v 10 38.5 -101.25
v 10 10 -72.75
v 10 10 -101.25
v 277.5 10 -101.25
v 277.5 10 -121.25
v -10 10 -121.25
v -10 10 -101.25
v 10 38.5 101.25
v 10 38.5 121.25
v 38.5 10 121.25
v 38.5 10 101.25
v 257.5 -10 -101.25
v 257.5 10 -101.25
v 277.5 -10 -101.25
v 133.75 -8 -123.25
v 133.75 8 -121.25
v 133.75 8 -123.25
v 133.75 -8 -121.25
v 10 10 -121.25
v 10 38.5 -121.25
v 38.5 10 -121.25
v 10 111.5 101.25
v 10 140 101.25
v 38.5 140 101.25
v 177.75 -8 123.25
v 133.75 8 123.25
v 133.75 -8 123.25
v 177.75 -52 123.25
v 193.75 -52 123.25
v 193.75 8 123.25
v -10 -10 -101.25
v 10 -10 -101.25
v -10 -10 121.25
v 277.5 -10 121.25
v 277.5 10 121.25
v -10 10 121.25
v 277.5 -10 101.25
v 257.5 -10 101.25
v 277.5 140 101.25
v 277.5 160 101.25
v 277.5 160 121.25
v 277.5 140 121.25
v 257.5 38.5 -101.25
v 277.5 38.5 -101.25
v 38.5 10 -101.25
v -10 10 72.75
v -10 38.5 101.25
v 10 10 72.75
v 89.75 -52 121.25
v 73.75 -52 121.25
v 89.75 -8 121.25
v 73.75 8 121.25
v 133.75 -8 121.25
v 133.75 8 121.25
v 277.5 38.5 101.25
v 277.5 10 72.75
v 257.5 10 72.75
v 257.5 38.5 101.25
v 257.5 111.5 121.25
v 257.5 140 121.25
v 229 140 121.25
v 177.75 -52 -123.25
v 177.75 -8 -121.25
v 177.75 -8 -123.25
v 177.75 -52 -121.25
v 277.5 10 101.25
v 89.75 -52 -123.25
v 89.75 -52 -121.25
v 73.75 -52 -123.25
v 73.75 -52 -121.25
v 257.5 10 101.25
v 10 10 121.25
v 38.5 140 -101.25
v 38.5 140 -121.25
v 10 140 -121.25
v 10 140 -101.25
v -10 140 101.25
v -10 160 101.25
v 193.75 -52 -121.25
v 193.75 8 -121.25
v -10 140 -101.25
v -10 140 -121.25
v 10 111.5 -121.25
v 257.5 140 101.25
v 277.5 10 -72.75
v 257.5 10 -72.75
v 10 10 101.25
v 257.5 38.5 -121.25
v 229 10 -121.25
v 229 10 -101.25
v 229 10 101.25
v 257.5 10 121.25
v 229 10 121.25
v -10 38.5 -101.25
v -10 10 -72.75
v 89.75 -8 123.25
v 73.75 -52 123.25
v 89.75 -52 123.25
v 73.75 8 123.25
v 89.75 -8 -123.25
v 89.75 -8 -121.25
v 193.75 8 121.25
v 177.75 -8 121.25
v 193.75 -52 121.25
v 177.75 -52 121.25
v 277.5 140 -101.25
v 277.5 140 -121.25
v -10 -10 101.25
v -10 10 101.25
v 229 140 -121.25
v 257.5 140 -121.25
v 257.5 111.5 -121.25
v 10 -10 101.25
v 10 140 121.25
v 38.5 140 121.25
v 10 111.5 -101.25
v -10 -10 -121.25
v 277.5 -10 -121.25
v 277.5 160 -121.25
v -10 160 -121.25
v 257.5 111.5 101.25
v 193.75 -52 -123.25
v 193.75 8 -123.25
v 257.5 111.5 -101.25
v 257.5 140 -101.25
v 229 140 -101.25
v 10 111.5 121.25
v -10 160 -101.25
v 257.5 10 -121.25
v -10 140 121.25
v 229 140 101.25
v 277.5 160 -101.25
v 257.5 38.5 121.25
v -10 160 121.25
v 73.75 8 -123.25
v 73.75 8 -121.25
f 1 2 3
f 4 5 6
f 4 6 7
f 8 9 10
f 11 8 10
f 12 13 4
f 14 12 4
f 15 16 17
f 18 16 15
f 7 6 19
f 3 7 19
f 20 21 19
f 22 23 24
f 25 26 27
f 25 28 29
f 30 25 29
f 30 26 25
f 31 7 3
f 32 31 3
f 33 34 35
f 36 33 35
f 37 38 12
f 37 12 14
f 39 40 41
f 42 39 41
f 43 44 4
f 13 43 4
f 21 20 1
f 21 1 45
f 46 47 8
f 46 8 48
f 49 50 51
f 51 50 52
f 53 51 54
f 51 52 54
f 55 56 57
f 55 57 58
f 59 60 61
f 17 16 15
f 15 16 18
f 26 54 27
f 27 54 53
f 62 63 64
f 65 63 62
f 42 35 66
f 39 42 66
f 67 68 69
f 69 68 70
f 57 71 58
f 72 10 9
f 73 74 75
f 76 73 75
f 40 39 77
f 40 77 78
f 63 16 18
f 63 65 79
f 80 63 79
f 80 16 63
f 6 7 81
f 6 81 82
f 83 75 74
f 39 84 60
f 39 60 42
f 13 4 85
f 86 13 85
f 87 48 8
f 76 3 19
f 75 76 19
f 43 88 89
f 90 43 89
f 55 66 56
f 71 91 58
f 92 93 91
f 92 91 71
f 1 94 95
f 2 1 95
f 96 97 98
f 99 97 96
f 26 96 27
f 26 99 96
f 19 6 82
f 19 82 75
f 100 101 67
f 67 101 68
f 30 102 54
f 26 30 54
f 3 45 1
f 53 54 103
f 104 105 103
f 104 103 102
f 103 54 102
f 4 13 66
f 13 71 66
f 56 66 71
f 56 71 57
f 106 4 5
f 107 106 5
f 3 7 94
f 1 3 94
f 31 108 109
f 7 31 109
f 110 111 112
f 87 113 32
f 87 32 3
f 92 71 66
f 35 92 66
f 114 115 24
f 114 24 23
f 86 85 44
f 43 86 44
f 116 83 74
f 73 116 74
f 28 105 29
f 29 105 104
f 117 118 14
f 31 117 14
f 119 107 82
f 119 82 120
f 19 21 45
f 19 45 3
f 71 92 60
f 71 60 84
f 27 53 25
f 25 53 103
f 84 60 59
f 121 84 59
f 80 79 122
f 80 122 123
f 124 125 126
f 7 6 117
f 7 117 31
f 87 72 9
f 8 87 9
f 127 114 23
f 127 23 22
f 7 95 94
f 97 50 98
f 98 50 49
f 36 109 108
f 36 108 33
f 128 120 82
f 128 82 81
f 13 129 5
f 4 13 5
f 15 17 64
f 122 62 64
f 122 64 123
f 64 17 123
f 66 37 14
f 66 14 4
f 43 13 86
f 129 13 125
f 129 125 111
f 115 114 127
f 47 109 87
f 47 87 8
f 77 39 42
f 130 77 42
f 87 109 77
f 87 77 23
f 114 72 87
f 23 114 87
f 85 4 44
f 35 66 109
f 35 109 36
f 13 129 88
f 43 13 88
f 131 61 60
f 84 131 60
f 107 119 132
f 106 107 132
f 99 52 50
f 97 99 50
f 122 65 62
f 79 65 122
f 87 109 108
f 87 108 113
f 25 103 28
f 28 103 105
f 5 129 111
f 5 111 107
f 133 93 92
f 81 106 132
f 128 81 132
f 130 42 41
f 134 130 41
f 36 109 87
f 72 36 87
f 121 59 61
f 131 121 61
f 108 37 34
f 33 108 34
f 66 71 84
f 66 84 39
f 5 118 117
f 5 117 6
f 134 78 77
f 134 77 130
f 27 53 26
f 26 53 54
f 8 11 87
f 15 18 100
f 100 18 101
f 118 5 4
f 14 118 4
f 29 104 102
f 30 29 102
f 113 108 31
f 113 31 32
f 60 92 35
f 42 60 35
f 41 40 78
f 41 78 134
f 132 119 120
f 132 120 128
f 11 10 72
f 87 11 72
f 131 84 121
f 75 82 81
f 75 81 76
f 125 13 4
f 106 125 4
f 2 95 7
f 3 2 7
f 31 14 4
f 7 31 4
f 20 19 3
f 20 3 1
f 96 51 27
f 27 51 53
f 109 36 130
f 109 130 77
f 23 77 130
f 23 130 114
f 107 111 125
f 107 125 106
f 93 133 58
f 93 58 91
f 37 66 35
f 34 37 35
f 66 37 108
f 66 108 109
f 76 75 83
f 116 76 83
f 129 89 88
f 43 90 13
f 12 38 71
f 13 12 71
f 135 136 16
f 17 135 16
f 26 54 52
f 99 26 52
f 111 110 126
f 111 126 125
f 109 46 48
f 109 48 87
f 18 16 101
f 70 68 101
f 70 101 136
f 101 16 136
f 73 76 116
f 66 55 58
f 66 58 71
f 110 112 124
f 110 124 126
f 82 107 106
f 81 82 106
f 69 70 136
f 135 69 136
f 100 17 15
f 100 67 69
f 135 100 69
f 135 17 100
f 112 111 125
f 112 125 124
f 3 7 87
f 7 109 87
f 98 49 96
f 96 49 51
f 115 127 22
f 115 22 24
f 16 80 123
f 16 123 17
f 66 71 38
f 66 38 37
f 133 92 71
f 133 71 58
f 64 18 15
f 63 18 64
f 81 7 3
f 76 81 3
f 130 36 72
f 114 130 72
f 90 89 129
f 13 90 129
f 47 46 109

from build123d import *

# Parameters (mm, degrees)
SKETCH1_W             = 20
SKETCH1_H             = 20
BOSS_EXTRUDE1_DEPTH   = 101.25
BOSS_EXTRUDE1_2_DEPTH = 101.25
SKETCH2_W             = 20
SKETCH2_H             = 20
BOSS_EXTRUDE2_DEPTH   = 287.5
BOSS_EXTRUDE2_2_DEPTH = 287.5
SKETCH4_W             = 20
SKETCH4_H             = 20
BOSS_EXTRUDE3_DEPTH   = 130
BOSS_EXTRUDE3_2_DEPTH = 130
BOSS_EXTRUDE3_3_DEPTH = 130
BOSS_EXTRUDE3_4_DEPTH = 130
SKETCH5_W             = 20
SKETCH5_H             = 20
BOSS_EXTRUDE4_DEPTH   = 287.5
BOSS_EXTRUDE4_2_DEPTH = 287.5
BOSS_EXTRUDE5_DEPTH   = 20
BOSS_EXTRUDE5_2_DEPTH = 20
BOSS_EXTRUDE6_DEPTH   = 20
BOSS_EXTRUDE6_2_DEPTH = 20
BOSS_EXTRUDE7_DEPTH   = 20
BOSS_EXTRUDE7_2_DEPTH = 20
BOSS_EXTRUDE7_3_DEPTH = 20
BOSS_EXTRUDE7_4_DEPTH = 20
BOSS_EXTRUDE8_DEPTH   = 20
BOSS_EXTRUDE8_2_DEPTH = 20
BOSS_EXTRUDE8_3_DEPTH = 20
BOSS_EXTRUDE8_4_DEPTH = 20
BOSS_EXTRUDE9_DEPTH   = 2
BOSS_EXTRUDE10_DEPTH  = 2
BOSS_EXTRUDE11_DEPTH  = 2
BOSS_EXTRUDE12_DEPTH  = 2


with BuildPart() as part:
    # Sketch1 → Boss-Extrude1 (new, symmetric)
    with BuildSketch(Plane.XY):
        Rectangle(SKETCH1_W, SKETCH1_H)
    extrude(amount=BOSS_EXTRUDE1_DEPTH, both=True)


with BuildPart() as body_2:
    # Sketch1 → Boss-Extrude1 2 (new, symmetric)
    with BuildSketch(Plane.XY):
        with Locations((267.5, 0)):
            Rectangle(SKETCH1_W, SKETCH1_H)
    extrude(amount=BOSS_EXTRUDE1_2_DEPTH, both=True)


with BuildPart() as body_3:
    # Sketch2 → Boss-Extrude2 (new body)
    with BuildSketch(Plane.ZY.offset(10)):
        with Locations((111.25, 0)):
            Rectangle(SKETCH2_W, SKETCH2_H)
    extrude(amount=-BOSS_EXTRUDE2_DEPTH)


with BuildPart() as body_4:
    # Sketch2 → Boss-Extrude2 2 (new body)
    with BuildSketch(Plane.ZY.offset(10)):
        with Locations((-111.25, 0)):
            Rectangle(SKETCH2_W, SKETCH2_H)
    extrude(amount=-BOSS_EXTRUDE2_2_DEPTH)


with BuildPart() as body_5:
    # Sketch4 → Boss-Extrude3 (new body)
    with BuildSketch(Plane(origin=(0, 10, 0), x_dir=(1, 0, 0), z_dir=(0, 1, 0))):
        with Locations((0, 111.25)):
            Rectangle(SKETCH4_W, SKETCH4_H)
    extrude(amount=BOSS_EXTRUDE3_DEPTH)


with BuildPart() as body_6:
    # Sketch4 → Boss-Extrude3 2 (new body)
    with BuildSketch(Plane(origin=(0, 10, 0), x_dir=(1, 0, 0), z_dir=(0, 1, 0))):
        with Locations((0, -111.25)):
            Rectangle(SKETCH4_W, SKETCH4_H)
    extrude(amount=BOSS_EXTRUDE3_2_DEPTH)


with BuildPart() as body_7:
    # Sketch4 → Boss-Extrude3 3 (new body)
    with BuildSketch(Plane(origin=(0, 10, 0), x_dir=(1, 0, 0), z_dir=(0, 1, 0))):
        with Locations((267.5, -111.25)):
            Rectangle(SKETCH4_W, SKETCH4_H)
    extrude(amount=BOSS_EXTRUDE3_3_DEPTH)


with BuildPart() as body_8:
    # Sketch4 → Boss-Extrude3 4 (new body)
    with BuildSketch(Plane(origin=(0, 10, 0), x_dir=(1, 0, 0), z_dir=(0, 1, 0))):
        with Locations((267.5, 111.25)):
            Rectangle(SKETCH4_W, SKETCH4_H)
    extrude(amount=BOSS_EXTRUDE3_4_DEPTH)


with BuildPart() as body_9:
    # Sketch5 → Boss-Extrude4 (new body)
    with BuildSketch(Plane.ZY.offset(10)):
        with Locations((-111.25, 150)):
            Rectangle(SKETCH5_W, SKETCH5_H)
    extrude(amount=-BOSS_EXTRUDE4_DEPTH)


with BuildPart() as body_10:
    # Sketch5 → Boss-Extrude4 2 (new body)
    with BuildSketch(Plane.ZY.offset(10)):
        with Locations((111.25, 150)):
            Rectangle(SKETCH5_W, SKETCH5_H)
    extrude(amount=-BOSS_EXTRUDE4_2_DEPTH)


with BuildPart() as body_11:
    # Sketch6 → Boss-Extrude5 (new body)
    with BuildSketch(Plane(origin=(277.5, 0, 0), x_dir=(0, 0, -1), z_dir=(1, 0, 0))):
        Polygon((-101.25, 10), (-72.75, 10), (-101.25, 38.5), align=None)
    extrude(amount=-BOSS_EXTRUDE5_DEPTH)


with BuildPart() as body_12:
    # Sketch6 → Boss-Extrude5 2 (new body)
    with BuildSketch(Plane(origin=(277.5, 0, 0), x_dir=(0, 0, -1), z_dir=(1, 0, 0))):
        Polygon((101.25, 10), (72.75, 10), (101.25, 38.5), align=None)
    extrude(amount=-BOSS_EXTRUDE5_2_DEPTH)


with BuildPart() as body_13:
    # Sketch7 → Boss-Extrude6 (new body)
    with BuildSketch(Plane.ZY.offset(10)):
        Polygon((-101.25, 10), (-101.25, 38.5), (-72.75, 10), align=None)
    extrude(amount=-BOSS_EXTRUDE6_DEPTH)


with BuildPart() as body_14:
    # Sketch7 → Boss-Extrude6 2 (new body)
    with BuildSketch(Plane.ZY.offset(10)):
        Polygon((101.25, 10), (101.25, 38.5), (72.75, 10), align=None)
    extrude(amount=-BOSS_EXTRUDE6_2_DEPTH)


with BuildPart() as body_15:
    # Sketch8 → Boss-Extrude7 (new body)
    with BuildSketch(Plane.XY.offset(121.25)):
        Polygon((10, 10), (10, 38.5), (38.5, 10), align=None)
    extrude(amount=-BOSS_EXTRUDE7_DEPTH)


with BuildPart() as body_16:
    # Sketch8 → Boss-Extrude7 2 (new body)
    with BuildSketch(Plane.XY.offset(121.25)):
        Polygon((10, 140), (10, 111.5), (38.5, 140), align=None)
    extrude(amount=-BOSS_EXTRUDE7_2_DEPTH)


with BuildPart() as body_17:
    # Sketch8 → Boss-Extrude7 3 (new body)
    with BuildSketch(Plane.XY.offset(121.25)):
        Polygon((257.5, 140), (257.5, 111.5), (229, 140), align=None)
    extrude(amount=-BOSS_EXTRUDE7_3_DEPTH)


with BuildPart() as body_18:
    # Sketch8 → Boss-Extrude7 4 (new body)
    with BuildSketch(Plane.XY.offset(121.25)):
        Polygon((257.5, 10), (257.5, 38.5), (229, 10), align=None)
    extrude(amount=-BOSS_EXTRUDE7_4_DEPTH)


with BuildPart() as body_19:
    # Sketch9 → Boss-Extrude8 (new body)
    with BuildSketch(Plane(origin=(0, 0, -121.25), x_dir=(-1, 0, 0), z_dir=(0, 0, -1))):
        Polygon((-229, 10), (-257.5, 10), (-257.5, 38.5), align=None)
    extrude(amount=-BOSS_EXTRUDE8_DEPTH)


with BuildPart() as body_20:
    # Sketch9 → Boss-Extrude8 2 (new body)
    with BuildSketch(Plane(origin=(0, 0, -121.25), x_dir=(-1, 0, 0), z_dir=(0, 0, -1))):
        Polygon((-38.5, 10), (-10, 10), (-10, 38.5), align=None)
    extrude(amount=-BOSS_EXTRUDE8_2_DEPTH)


with BuildPart() as body_21:
    # Sketch9 → Boss-Extrude8 3 (new body)
    with BuildSketch(Plane(origin=(0, 0, -121.25), x_dir=(-1, 0, 0), z_dir=(0, 0, -1))):
        Polygon((-10, 140), (-10, 111.5), (-38.5, 140), align=None)
    extrude(amount=-BOSS_EXTRUDE8_3_DEPTH)


with BuildPart() as body_22:
    # Sketch9 → Boss-Extrude8 4 (new body)
    with BuildSketch(Plane(origin=(0, 0, -121.25), x_dir=(-1, 0, 0), z_dir=(0, 0, -1))):
        Polygon((-229, 140), (-257.5, 140), (-257.5, 111.5), align=None)
    extrude(amount=-BOSS_EXTRUDE8_4_DEPTH)


with BuildPart() as body_23:
    # Sketch10 → Boss-Extrude9 (new body)
    with BuildSketch(Plane(origin=(0, 0, -121.25), x_dir=(-1, 0, 0), z_dir=(0, 0, -1))):
        Polygon((-133.75, 8), (-133.75, -8), (-89.75, -8), (-89.75, -52), (-73.75, -52), (-73.75, 8), align=None)
    extrude(amount=BOSS_EXTRUDE9_DEPTH)


with BuildPart() as body_24:
    # Sketch11 → Boss-Extrude10 (new body)
    with BuildSketch(Plane(origin=(0, 0, -121.25), x_dir=(-1, 0, 0), z_dir=(0, 0, -1))):
        Polygon((-193.75, 8), (-133.75, 8), (-133.75, -8), (-177.75, -8), (-177.75, -52), (-193.75, -52), align=None)
    extrude(amount=BOSS_EXTRUDE10_DEPTH)


with BuildPart() as body_25:
    # Sketch12 → Boss-Extrude11 (new body)
    with BuildSketch(Plane.XY.offset(121.25)):
        Polygon((133.75, 8), (133.75, -8), (177.75, -8), (177.75, -52), (193.75, -52), (193.75, 8), align=None)
    extrude(amount=BOSS_EXTRUDE11_DEPTH)


with BuildPart() as body_26:
    # Sketch13 → Boss-Extrude12 (new body)
    with BuildSketch(Plane.XY.offset(121.25)):
        Polygon((73.75, 8), (73.75, -52), (89.75, -52), (89.75, -8), (133.75, -8), (133.75, 8), align=None)
    extrude(amount=BOSS_EXTRUDE12_DEPTH)


solid = Compound([part.part, body_2.part, body_3.part, body_4.part, body_5.part, body_6.part, body_7.part, body_8.part, body_9.part, body_10.part, body_11.part, body_12.part, body_13.part, body_14.part, body_15.part, body_16.part, body_17.part, body_18.part, body_19.part, body_20.part, body_21.part, body_22.part, body_23.part, body_24.part, body_25.part, body_26.part])
